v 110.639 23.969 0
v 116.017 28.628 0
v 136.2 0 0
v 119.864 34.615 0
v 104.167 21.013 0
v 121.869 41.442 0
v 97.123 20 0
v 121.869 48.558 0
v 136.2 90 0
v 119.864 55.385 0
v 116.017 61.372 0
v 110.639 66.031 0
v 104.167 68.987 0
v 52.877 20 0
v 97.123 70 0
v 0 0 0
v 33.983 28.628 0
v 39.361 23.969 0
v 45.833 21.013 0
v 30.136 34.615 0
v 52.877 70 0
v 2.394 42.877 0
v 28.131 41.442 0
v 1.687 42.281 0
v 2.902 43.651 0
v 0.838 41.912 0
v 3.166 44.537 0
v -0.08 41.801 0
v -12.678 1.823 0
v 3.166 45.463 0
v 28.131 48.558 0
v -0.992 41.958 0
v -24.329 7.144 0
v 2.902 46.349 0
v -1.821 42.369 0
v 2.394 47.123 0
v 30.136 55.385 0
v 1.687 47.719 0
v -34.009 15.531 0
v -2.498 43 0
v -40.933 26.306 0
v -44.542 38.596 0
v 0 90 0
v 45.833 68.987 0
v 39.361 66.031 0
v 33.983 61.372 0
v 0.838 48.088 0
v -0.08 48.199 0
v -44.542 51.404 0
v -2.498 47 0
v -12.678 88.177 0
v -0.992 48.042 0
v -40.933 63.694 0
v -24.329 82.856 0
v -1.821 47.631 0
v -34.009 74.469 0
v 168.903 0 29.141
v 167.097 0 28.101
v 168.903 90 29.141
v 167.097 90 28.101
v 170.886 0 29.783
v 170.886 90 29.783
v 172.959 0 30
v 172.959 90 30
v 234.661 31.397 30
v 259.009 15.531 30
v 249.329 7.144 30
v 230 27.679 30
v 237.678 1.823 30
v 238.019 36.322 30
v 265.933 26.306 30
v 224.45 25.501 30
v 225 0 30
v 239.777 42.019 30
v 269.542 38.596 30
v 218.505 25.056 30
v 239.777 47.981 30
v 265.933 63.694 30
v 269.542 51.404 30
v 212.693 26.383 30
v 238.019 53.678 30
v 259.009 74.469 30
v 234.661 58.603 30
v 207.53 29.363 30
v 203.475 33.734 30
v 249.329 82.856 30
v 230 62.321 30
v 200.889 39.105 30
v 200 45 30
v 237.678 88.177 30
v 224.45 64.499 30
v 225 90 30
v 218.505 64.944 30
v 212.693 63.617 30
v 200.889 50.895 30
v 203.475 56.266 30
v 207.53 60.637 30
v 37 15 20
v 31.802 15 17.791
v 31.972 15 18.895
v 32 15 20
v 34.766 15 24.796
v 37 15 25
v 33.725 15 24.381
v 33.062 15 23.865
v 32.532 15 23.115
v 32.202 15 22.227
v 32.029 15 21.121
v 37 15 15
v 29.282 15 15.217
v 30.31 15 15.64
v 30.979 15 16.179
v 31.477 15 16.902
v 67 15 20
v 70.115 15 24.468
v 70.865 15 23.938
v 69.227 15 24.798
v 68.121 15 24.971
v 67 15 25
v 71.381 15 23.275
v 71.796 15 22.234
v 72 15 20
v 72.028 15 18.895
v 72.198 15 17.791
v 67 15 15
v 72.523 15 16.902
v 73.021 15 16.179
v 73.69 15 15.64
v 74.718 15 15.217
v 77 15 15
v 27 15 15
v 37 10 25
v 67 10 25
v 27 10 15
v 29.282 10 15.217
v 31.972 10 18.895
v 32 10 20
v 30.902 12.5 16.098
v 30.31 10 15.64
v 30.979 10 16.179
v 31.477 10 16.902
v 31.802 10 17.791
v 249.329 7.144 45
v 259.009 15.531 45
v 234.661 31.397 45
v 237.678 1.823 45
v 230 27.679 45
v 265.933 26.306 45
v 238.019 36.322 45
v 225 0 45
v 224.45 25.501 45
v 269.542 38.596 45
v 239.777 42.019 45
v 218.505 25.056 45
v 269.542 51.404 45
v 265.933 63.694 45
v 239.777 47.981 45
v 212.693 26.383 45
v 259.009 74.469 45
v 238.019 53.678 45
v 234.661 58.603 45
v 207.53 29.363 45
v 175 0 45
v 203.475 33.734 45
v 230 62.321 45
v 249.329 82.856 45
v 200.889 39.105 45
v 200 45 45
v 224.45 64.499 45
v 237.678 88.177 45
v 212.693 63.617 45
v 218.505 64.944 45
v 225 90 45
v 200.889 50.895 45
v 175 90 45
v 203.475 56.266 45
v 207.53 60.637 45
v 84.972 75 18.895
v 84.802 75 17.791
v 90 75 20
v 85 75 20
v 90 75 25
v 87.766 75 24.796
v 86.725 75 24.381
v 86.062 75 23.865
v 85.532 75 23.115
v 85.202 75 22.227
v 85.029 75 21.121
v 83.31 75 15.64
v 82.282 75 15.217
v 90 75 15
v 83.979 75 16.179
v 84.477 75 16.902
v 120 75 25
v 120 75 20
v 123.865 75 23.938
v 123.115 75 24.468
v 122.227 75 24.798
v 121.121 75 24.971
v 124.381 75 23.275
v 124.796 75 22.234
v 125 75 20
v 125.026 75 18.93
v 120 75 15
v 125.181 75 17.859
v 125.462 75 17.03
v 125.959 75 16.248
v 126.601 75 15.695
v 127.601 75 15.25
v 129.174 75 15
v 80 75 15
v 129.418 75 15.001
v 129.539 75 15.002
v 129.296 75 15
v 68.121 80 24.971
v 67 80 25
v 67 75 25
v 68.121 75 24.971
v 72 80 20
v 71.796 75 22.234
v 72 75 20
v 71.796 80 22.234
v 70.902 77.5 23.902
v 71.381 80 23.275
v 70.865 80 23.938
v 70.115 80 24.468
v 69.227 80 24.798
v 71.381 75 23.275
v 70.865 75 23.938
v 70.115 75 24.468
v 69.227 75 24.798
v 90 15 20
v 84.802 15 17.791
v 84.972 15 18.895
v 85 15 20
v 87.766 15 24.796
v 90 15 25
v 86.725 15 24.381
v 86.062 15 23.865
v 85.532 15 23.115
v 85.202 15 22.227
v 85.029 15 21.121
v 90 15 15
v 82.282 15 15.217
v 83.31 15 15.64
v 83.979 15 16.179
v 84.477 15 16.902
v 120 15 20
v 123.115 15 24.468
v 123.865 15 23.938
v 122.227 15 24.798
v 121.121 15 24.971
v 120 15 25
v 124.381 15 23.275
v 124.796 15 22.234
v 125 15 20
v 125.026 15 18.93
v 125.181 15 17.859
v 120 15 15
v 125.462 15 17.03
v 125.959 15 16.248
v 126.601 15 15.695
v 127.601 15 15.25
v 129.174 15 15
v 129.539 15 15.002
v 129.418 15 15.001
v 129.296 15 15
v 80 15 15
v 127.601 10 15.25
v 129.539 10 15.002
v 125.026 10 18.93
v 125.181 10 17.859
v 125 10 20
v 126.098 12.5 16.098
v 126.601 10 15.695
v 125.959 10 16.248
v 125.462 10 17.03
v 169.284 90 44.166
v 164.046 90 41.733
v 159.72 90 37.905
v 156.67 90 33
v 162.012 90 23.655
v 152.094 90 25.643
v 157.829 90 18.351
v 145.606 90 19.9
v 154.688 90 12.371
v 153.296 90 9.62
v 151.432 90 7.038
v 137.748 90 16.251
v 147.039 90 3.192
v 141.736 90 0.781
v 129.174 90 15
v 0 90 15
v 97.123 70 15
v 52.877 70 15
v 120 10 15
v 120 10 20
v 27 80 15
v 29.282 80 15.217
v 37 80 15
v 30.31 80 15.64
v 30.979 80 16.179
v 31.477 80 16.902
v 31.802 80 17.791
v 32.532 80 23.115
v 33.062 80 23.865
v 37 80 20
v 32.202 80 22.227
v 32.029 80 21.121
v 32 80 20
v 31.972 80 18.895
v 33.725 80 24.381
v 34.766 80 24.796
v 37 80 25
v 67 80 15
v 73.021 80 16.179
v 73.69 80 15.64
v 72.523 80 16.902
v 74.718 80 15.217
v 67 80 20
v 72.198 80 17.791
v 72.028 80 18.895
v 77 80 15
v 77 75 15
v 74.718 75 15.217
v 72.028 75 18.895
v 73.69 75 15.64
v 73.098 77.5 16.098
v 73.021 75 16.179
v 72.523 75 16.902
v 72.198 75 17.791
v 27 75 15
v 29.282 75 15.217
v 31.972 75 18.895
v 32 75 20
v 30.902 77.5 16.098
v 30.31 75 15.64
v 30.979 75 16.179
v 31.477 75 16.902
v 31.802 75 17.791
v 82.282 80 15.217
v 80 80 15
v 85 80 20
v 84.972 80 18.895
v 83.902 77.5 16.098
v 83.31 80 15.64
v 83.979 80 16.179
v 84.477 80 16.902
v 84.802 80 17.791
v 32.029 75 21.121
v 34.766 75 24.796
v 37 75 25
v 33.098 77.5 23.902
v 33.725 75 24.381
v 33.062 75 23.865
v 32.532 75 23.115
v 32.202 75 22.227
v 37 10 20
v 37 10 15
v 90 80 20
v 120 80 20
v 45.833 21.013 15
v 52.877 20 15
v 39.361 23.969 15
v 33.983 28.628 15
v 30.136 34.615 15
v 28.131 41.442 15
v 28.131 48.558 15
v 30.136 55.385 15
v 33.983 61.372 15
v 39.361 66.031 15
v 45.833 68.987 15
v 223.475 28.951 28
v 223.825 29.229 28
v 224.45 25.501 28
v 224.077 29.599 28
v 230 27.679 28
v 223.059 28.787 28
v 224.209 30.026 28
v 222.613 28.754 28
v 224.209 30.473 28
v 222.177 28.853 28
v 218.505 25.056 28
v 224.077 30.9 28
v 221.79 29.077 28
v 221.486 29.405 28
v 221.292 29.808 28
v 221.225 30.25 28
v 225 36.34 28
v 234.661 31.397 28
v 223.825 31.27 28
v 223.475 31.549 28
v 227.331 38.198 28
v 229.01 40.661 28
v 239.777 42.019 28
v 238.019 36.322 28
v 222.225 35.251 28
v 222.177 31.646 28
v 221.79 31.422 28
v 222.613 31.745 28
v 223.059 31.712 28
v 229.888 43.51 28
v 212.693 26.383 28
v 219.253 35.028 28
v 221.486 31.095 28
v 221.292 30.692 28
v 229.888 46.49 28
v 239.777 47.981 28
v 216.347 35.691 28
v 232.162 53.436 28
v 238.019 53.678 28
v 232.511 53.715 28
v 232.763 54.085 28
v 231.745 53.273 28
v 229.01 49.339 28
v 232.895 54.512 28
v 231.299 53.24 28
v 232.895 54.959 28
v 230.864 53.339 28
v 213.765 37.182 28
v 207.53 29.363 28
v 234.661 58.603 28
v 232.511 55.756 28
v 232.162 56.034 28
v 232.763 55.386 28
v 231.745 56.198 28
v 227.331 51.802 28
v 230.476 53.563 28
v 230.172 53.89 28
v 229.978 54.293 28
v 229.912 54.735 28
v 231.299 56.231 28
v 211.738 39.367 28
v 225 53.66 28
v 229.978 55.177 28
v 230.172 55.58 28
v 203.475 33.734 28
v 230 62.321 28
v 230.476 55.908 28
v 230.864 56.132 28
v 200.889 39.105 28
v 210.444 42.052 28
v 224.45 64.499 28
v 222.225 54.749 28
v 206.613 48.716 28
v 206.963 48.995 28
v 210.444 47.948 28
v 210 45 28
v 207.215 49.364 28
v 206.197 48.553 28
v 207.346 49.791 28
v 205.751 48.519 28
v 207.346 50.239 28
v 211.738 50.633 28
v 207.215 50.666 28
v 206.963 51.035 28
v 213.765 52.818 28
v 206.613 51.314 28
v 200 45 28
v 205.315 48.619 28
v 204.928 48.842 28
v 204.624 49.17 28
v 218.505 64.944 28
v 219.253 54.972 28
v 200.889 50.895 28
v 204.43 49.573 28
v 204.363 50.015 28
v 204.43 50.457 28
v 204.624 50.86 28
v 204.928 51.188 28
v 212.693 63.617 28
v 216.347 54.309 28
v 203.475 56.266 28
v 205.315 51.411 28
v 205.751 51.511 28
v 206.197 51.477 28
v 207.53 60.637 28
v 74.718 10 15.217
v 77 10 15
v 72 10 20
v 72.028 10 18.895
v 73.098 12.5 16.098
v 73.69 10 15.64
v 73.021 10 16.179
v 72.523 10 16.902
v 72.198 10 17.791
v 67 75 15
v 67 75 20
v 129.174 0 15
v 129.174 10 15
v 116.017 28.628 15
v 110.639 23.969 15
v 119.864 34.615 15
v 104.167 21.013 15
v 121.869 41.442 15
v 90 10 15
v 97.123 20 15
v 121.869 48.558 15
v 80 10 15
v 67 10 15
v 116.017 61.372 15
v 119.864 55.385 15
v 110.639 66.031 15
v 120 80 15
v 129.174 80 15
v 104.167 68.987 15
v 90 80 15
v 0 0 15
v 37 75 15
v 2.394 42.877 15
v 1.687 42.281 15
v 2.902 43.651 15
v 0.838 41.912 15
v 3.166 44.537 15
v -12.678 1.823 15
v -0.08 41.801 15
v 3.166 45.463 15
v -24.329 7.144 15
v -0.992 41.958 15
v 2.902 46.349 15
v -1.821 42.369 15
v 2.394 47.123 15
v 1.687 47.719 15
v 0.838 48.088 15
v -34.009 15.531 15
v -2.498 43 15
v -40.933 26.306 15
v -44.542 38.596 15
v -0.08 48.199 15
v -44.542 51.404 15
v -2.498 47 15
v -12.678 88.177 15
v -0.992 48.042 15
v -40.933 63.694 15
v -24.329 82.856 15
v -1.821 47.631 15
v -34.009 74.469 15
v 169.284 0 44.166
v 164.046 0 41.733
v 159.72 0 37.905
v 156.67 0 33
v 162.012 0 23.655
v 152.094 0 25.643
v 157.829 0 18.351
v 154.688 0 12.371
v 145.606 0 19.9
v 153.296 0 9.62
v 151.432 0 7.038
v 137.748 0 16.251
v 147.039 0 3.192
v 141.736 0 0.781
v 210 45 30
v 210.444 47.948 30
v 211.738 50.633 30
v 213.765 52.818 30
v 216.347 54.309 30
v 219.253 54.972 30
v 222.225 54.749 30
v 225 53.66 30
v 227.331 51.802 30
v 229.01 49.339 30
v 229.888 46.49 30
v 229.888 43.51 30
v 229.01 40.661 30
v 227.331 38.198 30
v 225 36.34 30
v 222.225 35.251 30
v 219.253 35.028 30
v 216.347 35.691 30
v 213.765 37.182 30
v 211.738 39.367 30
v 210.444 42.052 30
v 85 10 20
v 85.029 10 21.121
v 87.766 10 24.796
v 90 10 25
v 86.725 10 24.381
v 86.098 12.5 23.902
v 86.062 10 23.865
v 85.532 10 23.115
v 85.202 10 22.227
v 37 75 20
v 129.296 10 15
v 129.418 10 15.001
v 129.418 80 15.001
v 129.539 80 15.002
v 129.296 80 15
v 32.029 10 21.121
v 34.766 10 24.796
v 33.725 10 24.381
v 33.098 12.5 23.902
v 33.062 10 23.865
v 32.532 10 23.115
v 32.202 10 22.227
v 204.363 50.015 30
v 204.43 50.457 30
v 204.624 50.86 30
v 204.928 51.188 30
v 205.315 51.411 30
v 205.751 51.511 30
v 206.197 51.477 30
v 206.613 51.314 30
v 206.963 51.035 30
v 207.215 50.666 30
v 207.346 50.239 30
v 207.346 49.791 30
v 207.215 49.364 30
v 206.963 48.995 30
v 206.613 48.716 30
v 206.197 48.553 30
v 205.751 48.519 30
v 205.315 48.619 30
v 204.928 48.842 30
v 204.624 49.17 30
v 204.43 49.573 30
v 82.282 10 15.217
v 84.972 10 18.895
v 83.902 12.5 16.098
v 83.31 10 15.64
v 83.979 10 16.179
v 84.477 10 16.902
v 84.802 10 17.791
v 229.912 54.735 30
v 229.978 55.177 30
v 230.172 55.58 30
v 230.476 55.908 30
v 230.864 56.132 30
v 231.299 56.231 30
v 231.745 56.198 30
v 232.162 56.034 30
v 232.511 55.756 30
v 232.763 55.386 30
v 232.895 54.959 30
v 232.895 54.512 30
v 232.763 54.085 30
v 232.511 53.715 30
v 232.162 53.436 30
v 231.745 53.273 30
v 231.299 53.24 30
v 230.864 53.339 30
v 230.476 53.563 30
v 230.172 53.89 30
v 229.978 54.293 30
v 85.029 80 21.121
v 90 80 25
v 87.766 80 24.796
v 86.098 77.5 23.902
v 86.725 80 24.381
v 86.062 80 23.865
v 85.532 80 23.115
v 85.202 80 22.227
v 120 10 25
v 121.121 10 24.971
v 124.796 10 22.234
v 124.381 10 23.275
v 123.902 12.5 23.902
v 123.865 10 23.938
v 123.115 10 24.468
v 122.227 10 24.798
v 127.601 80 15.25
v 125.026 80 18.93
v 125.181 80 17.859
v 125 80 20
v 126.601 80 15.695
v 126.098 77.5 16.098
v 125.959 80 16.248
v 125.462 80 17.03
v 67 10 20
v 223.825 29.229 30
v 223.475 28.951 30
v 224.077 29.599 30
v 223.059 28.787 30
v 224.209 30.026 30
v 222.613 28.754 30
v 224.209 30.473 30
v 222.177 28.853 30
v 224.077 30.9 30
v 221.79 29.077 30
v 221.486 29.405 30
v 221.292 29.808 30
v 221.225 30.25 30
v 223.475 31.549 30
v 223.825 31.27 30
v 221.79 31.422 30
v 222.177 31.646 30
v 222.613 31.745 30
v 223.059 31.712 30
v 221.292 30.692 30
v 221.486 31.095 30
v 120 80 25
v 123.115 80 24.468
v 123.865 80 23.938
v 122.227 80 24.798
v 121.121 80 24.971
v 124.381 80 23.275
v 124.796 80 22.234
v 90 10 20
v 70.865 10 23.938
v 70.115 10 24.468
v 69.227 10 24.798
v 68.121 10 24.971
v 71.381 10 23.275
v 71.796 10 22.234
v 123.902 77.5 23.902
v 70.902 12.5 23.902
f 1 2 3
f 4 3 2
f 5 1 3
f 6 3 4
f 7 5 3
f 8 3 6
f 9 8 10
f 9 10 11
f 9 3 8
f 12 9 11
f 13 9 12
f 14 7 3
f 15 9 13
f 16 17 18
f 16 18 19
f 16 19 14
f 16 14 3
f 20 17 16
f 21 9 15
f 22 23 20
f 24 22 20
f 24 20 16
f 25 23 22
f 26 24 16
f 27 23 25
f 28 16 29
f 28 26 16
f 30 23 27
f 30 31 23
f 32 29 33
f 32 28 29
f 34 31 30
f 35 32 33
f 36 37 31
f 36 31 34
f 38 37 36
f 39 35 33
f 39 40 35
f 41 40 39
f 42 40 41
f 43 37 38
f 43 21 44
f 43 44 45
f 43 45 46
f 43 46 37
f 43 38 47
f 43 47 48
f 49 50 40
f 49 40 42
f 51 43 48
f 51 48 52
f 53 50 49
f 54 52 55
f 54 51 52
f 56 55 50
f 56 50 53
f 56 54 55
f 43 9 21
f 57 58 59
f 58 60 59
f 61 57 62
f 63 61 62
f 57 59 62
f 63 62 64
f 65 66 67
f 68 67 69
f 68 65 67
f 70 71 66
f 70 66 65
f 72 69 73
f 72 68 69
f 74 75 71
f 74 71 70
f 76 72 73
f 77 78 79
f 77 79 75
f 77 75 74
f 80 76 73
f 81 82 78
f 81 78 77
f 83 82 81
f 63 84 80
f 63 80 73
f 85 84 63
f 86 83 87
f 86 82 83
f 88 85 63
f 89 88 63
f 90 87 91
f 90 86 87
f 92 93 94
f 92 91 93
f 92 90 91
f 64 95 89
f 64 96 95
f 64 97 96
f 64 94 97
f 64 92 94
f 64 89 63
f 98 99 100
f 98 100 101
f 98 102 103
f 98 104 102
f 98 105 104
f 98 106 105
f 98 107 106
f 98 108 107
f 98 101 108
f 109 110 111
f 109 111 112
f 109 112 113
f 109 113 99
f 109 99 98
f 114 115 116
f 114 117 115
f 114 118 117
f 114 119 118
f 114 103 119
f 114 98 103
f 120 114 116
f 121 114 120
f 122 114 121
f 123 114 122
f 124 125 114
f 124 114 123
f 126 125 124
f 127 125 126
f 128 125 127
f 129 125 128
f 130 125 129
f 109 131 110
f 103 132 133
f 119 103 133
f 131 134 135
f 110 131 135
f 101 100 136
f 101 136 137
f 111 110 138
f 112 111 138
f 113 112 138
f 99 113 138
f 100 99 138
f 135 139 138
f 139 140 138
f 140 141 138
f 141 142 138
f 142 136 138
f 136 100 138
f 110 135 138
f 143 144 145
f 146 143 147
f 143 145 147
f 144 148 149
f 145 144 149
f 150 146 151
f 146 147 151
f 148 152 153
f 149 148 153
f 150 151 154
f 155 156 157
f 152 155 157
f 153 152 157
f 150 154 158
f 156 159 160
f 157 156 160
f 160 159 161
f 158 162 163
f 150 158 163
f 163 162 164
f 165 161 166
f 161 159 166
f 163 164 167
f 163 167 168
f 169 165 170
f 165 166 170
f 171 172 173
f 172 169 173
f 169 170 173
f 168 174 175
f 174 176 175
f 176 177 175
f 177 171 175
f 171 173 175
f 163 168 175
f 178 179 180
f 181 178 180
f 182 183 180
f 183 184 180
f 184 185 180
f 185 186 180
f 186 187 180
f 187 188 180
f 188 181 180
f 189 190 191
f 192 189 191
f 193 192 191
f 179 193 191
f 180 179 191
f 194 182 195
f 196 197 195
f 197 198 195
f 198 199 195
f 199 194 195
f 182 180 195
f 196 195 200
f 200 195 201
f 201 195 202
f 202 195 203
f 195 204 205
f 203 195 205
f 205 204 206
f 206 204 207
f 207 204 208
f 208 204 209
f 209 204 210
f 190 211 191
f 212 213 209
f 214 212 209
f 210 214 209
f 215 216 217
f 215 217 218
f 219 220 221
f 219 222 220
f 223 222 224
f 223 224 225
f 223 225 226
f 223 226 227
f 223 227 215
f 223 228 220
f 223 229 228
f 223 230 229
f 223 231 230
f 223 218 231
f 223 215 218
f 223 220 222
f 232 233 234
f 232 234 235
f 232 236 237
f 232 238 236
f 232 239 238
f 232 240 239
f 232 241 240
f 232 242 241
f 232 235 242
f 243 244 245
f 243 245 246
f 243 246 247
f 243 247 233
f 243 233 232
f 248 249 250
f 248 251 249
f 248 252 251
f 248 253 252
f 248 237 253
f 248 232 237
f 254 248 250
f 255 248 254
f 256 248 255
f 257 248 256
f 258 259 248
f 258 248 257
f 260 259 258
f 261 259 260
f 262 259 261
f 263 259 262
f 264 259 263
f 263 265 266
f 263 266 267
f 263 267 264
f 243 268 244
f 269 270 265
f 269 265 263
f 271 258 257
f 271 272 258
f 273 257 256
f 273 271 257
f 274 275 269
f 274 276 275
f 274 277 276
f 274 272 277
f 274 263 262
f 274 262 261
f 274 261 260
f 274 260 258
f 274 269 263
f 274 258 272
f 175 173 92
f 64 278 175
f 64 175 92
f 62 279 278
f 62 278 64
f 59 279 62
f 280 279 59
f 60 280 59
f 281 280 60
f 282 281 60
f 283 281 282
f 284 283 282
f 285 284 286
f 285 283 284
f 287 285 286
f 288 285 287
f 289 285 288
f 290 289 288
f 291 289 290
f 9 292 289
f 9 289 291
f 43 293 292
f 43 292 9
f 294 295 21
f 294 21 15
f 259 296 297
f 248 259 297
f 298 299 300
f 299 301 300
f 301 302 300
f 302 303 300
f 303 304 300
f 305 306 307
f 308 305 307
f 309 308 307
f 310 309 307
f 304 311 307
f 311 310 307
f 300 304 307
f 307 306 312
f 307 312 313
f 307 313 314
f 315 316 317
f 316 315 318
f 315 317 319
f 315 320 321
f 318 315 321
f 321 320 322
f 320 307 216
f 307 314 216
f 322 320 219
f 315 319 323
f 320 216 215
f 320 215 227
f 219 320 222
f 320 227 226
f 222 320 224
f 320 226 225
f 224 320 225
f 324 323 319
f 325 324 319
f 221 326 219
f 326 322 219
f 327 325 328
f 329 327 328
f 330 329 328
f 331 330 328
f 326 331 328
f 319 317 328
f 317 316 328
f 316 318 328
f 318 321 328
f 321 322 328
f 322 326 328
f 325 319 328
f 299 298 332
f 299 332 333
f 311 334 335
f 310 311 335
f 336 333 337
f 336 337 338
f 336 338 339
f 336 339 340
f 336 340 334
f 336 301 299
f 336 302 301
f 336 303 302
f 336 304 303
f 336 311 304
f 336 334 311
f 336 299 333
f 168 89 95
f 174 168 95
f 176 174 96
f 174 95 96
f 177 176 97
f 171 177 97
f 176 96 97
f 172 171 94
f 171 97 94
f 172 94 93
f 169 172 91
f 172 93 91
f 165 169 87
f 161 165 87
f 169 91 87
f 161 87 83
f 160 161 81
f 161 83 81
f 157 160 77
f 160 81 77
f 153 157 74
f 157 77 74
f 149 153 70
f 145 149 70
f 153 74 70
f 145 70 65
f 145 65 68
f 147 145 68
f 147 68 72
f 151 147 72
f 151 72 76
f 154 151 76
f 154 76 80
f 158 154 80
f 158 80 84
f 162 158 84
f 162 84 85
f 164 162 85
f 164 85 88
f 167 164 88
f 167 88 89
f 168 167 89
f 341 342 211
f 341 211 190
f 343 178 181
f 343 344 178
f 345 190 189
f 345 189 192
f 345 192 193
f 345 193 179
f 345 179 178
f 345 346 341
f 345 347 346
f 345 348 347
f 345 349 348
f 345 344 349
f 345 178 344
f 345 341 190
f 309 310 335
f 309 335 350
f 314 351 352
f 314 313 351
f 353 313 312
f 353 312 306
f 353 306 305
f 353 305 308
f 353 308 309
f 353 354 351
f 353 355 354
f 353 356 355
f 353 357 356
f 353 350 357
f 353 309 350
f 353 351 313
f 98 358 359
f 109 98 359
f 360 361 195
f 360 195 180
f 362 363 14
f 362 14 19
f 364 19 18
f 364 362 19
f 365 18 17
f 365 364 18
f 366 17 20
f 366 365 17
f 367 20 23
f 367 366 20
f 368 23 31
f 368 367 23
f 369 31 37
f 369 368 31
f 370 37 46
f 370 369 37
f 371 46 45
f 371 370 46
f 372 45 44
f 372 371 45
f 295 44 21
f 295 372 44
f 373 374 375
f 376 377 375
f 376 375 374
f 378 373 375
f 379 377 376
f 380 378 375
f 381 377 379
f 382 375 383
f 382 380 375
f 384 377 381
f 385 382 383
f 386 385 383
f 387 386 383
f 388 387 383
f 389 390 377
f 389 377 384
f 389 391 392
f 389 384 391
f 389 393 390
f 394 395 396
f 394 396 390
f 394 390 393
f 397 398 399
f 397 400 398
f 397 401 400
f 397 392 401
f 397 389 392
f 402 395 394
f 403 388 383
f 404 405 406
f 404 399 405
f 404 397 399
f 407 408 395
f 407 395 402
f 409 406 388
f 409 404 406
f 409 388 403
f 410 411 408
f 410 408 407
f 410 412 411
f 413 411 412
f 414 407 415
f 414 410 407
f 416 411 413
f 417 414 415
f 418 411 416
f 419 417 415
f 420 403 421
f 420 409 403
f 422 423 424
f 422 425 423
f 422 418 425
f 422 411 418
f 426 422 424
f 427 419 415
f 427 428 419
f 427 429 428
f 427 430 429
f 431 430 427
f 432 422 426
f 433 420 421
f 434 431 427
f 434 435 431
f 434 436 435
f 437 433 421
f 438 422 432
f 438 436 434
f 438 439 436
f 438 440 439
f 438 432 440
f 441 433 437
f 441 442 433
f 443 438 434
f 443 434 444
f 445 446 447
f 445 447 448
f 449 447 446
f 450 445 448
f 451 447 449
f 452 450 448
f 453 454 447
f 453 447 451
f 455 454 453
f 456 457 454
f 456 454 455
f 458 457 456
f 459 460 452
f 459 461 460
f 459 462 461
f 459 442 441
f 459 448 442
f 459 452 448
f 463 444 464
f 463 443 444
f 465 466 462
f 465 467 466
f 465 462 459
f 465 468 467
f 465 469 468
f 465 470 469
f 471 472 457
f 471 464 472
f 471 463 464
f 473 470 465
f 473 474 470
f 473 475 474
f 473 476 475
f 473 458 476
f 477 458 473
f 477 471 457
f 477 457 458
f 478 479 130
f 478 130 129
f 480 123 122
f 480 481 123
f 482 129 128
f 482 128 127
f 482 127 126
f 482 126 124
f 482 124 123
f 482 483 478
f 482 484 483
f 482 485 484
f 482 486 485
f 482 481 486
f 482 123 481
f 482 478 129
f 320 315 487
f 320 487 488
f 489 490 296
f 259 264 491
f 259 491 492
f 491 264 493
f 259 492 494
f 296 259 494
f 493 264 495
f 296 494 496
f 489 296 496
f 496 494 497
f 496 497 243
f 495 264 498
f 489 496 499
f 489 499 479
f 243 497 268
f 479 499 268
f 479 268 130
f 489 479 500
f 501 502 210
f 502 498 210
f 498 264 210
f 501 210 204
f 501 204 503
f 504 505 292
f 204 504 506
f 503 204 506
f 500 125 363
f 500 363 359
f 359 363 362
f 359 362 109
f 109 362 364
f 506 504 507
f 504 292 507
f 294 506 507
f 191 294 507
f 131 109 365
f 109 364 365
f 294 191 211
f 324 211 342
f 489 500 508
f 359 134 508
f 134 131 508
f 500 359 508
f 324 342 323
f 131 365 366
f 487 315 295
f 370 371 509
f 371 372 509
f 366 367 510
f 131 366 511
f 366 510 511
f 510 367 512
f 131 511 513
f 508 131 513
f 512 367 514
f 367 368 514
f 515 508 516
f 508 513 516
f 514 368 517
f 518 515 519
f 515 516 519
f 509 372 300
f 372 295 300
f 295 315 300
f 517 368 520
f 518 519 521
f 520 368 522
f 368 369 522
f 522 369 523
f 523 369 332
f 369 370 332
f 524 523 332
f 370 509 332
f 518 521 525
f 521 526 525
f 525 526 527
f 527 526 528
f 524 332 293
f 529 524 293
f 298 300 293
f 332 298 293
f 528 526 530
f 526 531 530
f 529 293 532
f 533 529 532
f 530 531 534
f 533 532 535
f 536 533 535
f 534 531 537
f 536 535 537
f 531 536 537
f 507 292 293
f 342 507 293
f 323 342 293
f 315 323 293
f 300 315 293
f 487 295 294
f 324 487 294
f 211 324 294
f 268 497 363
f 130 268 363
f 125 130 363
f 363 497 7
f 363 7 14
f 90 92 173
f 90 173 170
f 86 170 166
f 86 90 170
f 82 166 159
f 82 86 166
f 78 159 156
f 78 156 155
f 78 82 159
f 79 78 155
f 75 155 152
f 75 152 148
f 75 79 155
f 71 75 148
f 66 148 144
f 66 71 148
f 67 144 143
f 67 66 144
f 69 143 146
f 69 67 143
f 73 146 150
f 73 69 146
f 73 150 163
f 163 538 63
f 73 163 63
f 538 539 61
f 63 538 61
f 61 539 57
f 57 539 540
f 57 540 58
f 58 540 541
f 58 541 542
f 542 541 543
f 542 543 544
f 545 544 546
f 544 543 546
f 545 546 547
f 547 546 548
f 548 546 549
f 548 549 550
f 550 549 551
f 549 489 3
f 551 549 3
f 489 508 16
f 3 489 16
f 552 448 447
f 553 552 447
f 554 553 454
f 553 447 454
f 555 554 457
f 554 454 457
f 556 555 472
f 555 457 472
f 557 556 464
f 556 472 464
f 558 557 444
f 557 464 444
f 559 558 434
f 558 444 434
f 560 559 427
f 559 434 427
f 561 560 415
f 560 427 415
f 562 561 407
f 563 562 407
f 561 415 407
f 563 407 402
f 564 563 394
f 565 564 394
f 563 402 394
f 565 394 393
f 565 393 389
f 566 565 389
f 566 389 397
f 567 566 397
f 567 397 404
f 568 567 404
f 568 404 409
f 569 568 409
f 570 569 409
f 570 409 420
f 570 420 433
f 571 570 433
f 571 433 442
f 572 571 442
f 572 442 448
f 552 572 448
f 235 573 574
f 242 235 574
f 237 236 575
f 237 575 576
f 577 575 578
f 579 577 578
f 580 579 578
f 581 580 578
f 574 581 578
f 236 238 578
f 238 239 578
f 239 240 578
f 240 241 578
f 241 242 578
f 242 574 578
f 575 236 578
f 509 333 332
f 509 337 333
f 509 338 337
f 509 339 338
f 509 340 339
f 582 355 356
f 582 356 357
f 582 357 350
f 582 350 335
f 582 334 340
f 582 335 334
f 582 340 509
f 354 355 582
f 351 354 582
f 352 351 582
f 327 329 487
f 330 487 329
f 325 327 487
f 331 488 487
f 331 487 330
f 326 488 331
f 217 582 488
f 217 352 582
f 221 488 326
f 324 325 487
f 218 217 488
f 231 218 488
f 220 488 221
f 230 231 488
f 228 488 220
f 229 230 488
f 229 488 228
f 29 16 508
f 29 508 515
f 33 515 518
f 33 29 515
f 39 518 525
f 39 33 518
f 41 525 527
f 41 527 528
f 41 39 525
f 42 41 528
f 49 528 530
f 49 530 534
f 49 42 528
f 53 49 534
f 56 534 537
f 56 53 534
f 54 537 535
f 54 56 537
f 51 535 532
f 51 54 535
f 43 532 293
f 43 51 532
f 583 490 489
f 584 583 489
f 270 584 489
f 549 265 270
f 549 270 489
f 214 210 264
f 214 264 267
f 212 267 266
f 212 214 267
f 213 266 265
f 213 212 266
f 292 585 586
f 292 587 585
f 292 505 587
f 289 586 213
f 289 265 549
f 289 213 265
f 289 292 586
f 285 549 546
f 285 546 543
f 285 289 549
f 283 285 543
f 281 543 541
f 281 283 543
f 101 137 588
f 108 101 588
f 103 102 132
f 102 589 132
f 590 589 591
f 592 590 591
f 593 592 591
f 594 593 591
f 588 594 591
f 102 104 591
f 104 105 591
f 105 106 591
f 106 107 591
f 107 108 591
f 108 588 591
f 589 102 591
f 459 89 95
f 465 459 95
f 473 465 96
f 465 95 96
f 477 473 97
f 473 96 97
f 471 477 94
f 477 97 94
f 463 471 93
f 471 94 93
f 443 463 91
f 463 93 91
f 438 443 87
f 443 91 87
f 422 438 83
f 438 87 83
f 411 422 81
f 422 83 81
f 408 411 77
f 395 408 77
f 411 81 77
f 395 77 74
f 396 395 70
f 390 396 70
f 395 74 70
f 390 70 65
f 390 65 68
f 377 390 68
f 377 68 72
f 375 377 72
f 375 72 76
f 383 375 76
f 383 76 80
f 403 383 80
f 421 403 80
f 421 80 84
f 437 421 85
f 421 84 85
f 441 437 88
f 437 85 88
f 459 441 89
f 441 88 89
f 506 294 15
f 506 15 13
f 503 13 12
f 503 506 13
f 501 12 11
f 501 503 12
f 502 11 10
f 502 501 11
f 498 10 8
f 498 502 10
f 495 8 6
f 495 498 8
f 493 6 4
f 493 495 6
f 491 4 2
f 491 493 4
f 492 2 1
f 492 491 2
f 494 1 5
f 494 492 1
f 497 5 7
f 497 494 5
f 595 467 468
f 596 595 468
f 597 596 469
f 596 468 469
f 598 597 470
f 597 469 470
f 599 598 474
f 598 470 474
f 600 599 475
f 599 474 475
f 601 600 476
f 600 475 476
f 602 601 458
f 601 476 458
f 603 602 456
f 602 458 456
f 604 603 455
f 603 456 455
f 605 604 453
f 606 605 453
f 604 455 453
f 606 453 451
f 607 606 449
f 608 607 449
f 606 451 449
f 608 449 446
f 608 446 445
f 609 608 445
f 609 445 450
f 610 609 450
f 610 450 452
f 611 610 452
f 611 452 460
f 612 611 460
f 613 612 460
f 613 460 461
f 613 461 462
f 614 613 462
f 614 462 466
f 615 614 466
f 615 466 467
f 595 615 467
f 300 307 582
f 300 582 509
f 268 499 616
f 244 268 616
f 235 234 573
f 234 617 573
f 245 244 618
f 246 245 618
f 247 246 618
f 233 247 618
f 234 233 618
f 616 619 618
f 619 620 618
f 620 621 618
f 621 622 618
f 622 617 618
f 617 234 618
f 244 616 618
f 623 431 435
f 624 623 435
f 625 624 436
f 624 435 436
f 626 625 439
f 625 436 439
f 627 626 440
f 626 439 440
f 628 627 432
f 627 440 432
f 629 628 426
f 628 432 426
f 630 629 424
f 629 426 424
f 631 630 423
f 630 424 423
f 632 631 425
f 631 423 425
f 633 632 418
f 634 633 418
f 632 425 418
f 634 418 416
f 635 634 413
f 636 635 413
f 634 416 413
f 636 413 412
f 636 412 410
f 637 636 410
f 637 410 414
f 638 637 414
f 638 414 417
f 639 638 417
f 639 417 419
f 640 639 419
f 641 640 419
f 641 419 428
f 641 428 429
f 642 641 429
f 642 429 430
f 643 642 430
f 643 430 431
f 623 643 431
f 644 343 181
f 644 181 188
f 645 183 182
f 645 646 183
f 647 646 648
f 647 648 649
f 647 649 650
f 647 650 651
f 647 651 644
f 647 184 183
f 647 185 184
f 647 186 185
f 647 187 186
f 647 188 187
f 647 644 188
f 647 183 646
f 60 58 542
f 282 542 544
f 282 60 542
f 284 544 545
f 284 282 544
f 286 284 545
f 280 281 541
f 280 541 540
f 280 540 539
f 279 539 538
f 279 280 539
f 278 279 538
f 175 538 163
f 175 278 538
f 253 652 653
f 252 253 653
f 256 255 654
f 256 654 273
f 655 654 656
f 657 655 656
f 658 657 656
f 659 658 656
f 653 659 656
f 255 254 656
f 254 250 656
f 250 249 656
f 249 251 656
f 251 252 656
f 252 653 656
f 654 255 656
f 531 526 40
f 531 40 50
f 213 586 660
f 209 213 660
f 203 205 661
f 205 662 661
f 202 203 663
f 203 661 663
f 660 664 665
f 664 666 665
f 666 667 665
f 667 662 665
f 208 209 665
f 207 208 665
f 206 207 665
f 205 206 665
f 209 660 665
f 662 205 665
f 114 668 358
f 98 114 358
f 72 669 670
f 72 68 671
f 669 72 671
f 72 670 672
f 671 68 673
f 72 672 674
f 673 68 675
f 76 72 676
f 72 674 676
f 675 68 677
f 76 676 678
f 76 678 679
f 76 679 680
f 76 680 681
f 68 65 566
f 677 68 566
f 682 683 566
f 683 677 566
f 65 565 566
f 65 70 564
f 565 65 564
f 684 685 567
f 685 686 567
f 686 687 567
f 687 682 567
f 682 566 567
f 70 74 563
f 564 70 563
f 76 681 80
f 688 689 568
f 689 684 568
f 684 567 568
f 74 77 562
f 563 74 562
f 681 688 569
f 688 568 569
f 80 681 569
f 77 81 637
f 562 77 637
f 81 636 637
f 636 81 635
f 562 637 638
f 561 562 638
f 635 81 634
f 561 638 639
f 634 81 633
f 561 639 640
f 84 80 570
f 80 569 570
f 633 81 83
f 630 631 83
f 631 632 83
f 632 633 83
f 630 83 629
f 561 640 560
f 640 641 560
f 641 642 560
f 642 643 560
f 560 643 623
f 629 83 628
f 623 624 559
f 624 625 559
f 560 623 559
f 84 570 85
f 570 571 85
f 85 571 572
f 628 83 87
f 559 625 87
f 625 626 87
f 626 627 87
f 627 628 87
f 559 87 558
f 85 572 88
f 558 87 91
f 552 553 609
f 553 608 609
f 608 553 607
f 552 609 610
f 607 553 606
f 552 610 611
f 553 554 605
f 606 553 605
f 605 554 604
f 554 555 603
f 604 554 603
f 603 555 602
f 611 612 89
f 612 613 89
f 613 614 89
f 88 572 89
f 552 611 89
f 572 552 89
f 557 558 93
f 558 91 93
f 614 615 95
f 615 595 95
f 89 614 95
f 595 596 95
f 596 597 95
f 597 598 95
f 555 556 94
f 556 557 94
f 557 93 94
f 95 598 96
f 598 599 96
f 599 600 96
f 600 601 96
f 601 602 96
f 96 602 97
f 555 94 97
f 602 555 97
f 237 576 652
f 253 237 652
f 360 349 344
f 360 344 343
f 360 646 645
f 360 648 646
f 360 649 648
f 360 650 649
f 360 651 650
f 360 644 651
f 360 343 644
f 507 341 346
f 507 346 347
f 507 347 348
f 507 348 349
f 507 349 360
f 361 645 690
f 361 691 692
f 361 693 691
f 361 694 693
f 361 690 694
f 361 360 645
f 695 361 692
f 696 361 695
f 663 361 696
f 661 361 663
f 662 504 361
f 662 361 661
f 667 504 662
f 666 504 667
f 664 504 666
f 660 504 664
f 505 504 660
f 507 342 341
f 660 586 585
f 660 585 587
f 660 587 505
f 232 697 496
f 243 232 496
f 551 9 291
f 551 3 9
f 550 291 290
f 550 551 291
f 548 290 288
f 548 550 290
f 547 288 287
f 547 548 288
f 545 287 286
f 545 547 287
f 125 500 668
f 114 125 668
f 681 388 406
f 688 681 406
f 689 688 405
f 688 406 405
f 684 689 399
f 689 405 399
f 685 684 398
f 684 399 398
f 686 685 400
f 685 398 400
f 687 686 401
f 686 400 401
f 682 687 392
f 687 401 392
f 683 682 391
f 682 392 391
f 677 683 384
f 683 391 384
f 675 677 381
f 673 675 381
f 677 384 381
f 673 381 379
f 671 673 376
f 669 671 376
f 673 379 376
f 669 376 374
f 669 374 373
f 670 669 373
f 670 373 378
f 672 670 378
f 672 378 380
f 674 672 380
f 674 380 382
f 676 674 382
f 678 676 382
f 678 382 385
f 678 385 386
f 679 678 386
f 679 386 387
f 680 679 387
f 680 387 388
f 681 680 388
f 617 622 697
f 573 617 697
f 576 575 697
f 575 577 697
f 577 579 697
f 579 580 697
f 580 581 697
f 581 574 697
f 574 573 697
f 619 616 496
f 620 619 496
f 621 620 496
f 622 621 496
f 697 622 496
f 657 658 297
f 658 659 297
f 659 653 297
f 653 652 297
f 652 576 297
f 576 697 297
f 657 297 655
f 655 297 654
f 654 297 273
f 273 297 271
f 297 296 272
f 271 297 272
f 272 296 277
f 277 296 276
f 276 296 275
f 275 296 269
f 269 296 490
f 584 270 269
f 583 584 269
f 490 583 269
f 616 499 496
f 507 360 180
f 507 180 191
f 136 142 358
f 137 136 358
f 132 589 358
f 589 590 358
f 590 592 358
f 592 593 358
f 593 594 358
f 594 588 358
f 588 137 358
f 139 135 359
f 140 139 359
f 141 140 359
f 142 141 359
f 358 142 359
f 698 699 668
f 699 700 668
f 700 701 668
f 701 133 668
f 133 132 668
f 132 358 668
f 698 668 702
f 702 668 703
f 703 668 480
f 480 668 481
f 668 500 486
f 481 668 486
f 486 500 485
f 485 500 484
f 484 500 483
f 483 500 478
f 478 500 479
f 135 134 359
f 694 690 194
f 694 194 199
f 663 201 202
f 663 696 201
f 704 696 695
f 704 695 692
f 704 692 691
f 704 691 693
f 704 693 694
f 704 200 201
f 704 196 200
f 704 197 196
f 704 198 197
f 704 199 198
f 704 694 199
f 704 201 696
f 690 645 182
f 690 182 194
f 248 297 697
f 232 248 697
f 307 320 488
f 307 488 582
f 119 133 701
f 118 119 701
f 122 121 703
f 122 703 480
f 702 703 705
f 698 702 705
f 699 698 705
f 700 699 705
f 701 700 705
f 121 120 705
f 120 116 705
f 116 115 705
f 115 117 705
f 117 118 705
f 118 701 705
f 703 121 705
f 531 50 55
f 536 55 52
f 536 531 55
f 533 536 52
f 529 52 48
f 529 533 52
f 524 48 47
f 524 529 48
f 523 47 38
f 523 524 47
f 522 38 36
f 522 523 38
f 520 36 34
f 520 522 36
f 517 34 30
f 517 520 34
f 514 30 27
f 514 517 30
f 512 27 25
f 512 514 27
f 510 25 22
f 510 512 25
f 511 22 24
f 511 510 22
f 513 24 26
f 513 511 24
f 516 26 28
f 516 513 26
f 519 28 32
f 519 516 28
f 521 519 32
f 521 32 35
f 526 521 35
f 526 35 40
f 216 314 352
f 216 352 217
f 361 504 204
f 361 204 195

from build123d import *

# Parameters (mm, degrees)
BOSS_EXTRU_1_DEPTH                = 15
ESQUISSE2_W                       = 15
ESQUISSE2_H                       = 90
BOSS_EXTRU_2_DEPTH                = 15
BOSS_EXTRU_3_DEPTH                = 15
ENL_V_MAT_EXTRU_2_DEPTH           = 287.181760425
ESQUISSE11_R                      = 20
ENL_V_MAT_EXTRU_3_DEPTH           = 20
BOSS_EXTRU_5_DEPTH                = 5
R_P_TITION_LIN_AIRE2_COUNT        = 2
R_P_TITION_LIN_AIRE2_PITCH        = 53
R_P_TITION_LIN_AIRE2_COPY_1_DEPTH = 5
CONG_3_SIZE                       = 5
CONG_4_R                          = 20
CONG_8_R                          = 30
ENL_V_MAT_EXTRU_4_DEPTH           = 289.140590716
CONG_9_R                          = 20
CONG_10_R                         = 10
ESQUISSE23_R                      = 20
BOSS_EXTRU_7_DEPTH                = 2
ESQUISSE24_R                      = 10
ESQUISSE24_R_2                    = 1.5
ENL_V_MAT_EXTRU_5_DEPTH           = 5
ENL_V_MAT_EXTRU_6_DEPTH           = 287.181760467


with BuildPart() as part:
    # Esquisse1 → Boss.-Extru.1 (new body)
    with BuildSketch(Plane.XY):
        with BuildLine():
            Line((0, 90), (170, 90))
            Line((170, 90), (170, 0))
            Line((170, 0), (0, 0))
            ThreePointArc((0, 0), (-45, 45), (0, 90))
        make_face()
    extrude(amount=BOSS_EXTRU_1_DEPTH)

    # Esquisse2 → Boss.-Extru.2 (add)
    with BuildSketch(Plane.XY.offset(15)):
        with Locations((162.5, 45)):
            Rectangle(ESQUISSE2_W, ESQUISSE2_H)
    extrude(amount=BOSS_EXTRU_2_DEPTH)

    # Esquisse3 → Boss.-Extru.3 (add)
    with BuildSketch(Plane.XY.offset(30)):
        with BuildLine():
            Line((155, 90), (225, 90))
            ThreePointArc((225, 90), (270, 45), (225, 0))
            Line((225, 0), (155, 0))
            Line((155, 0), (155, 90))
        make_face()
    extrude(amount=BOSS_EXTRU_3_DEPTH)

    # Esquisse10 → Enlèv. mat.-Extru.2 (cut, through all)
    with BuildSketch(Plane.XY.offset(15)):
        with BuildLine():
            Line((-2.497999199, 43), (-2.497999199, 47))
            ThreePointArc((-2.497999199, 47), (3.2, 45), (-2.497999199, 43))
        make_face()
    extrude(amount=-ENL_V_MAT_EXTRU_2_DEPTH, mode=Mode.SUBTRACT)

    # Esquisse11 → Enlèv. mat.-Extru.3 (cut)
    with BuildSketch(Plane(origin=(0, 0, 30), x_dir=(-1, 0, 0), z_dir=(0, 0, -1))):
        with Locations((-220, 45)):
            Circle(ESQUISSE11_R)
    extrude(amount=-ENL_V_MAT_EXTRU_3_DEPTH, mode=Mode.SUBTRACT)

    # Esquisse20 → Boss.-Extru.5 (add)
    with BuildSketch(Plane(origin=(0, 10, 0), x_dir=(1, 0, 0), z_dir=(0, 1, 0))):
        Polygon((125, -25), (125, -15), (120, -15), (120, -20), (90, -20), (90, -15), (85, -15), (85, -25), align=None)
    boss_extru_5 = extrude(amount=BOSS_EXTRU_5_DEPTH)

    # Symétrie2: Boss.-Extru.5 across plane
    add(boss_extru_5.mirror(Plane(origin=(170, 45, 0), x_dir=(0, 0, 1), z_dir=(0, -1, 0))))

    # Répétition linéaire2: Boss.-Extru.5 ×2
    with Locations(*[(-i * R_P_TITION_LIN_AIRE2_PITCH, 0, 0) for i in range(1, R_P_TITION_LIN_AIRE2_COUNT)]):
        add(boss_extru_5)

    # Répétition linéaire2 copy 1 sketch → Répétition linéaire2 copy 1 (add)
    with BuildSketch(Plane(origin=(-53, 80, 0), x_dir=(1, 0, 0), z_dir=(0, -1, 0))):
        Polygon((125, 25), (125, 15), (120, 15), (120, 20), (90, 20), (90, 15), (85, 15), (85, 25), align=None)
    extrude(amount=R_P_TITION_LIN_AIRE2_COPY_1_DEPTH)

    # Congé3
    # a fillet whose section is not a circle: 5 mm, written as the material it adds along each edge
    with BuildSketch(Plane(origin=(125, 80, 15), x_dir=(1, 0, 0), z_dir=(0, -1, 0)), Plane(origin=(72, 80, 15), x_dir=(1, 0, 0), z_dir=(0, -1, 0)), Plane(origin=(32, 10, 15), x_dir=(-1, 0, 0), z_dir=(0, 1, 0)), Plane(origin=(85, 10, 15), x_dir=(-1, 0, 0), z_dir=(0, 1, 0))) as cong_3_piece_1:
        with BuildLine():
            add(Edge.make_bspline([(CONG_3_SIZE, 0), (CONG_3_SIZE * 0.831801948466, 0), (CONG_3_SIZE * 0.663603896932, 0), (CONG_3_SIZE * 0.292893218813, CONG_3_SIZE * 0.0716919198361), (CONG_3_SIZE * 0.0716919198361, CONG_3_SIZE * 0.292893218813), (0, CONG_3_SIZE * 0.663603896932), (0, CONG_3_SIZE * 0.831801948466), (0, CONG_3_SIZE)], knots=[0, 0, 0, 0, 0, 0, 0.5, 0.5, 1, 1, 1, 1, 1, 1], degree=5))
            Line((0, CONG_3_SIZE), (0, 0))
            Line((0, 0), (CONG_3_SIZE, 0))
        make_face()
    extrude(amount=5)
    with BuildSketch(Plane(origin=(85, 80, 15), x_dir=(-1, 0, 0), z_dir=(0, -1, 0)), Plane(origin=(32, 80, 15), x_dir=(-1, 0, 0), z_dir=(0, -1, 0)), Plane(origin=(72, 10, 15), x_dir=(1, 0, 0), z_dir=(0, 1, 0)), Plane(origin=(125, 10, 15), x_dir=(1, 0, 0), z_dir=(0, 1, 0))) as cong_3_piece_2:
        with BuildLine():
            add(Edge.make_bspline([(CONG_3_SIZE, 0), (CONG_3_SIZE * 0.831801948466, 0), (CONG_3_SIZE * 0.663603896932, 0), (CONG_3_SIZE * 0.292893218813, -CONG_3_SIZE * 0.0716919198361), (CONG_3_SIZE * 0.0716919198361, -CONG_3_SIZE * 0.292893218813), (0, -CONG_3_SIZE * 0.663603896932), (0, -CONG_3_SIZE * 0.831801948466), (0, -CONG_3_SIZE)], knots=[0, 0, 0, 0, 0, 0, 0.5, 0.5, 1, 1, 1, 1, 1, 1], degree=5))
            Line((0, -CONG_3_SIZE), (0, 0))
            Line((0, 0), (CONG_3_SIZE, 0))
        make_face()
    extrude(amount=5)
    # a fillet whose section is not a circle: 5 mm, written as the material it takes off along each edge
    with BuildSketch(Plane(origin=(125, 92.5, 25), x_dir=(-1, 0, 0), z_dir=(0, -1, 0)), Plane(origin=(85, 92.5, 25), x_dir=(0, 0, -1), z_dir=(0, -1, 0)), Plane(origin=(32, 92.5, 25), x_dir=(0, 0, -1), z_dir=(0, -1, 0)), Plane(origin=(72, 92.5, 25), x_dir=(-1, 0, 0), z_dir=(0, -1, 0))) as cong_3_2_piece_1:
        with BuildLine():
            add(Edge.make_bspline([(CONG_3_SIZE, 0), (CONG_3_SIZE * 0.831801948466, 0), (CONG_3_SIZE * 0.663603896932, 0), (CONG_3_SIZE * 0.292893218813, CONG_3_SIZE * 0.0716919198361), (CONG_3_SIZE * 0.0716919198361, CONG_3_SIZE * 0.292893218813), (0, CONG_3_SIZE * 0.663603896932), (0, CONG_3_SIZE * 0.831801948466), (0, CONG_3_SIZE)], knots=[0, 0, 0, 0, 0, 0, 0.5, 0.5, 1, 1, 1, 1, 1, 1], degree=5))
            Line((0, CONG_3_SIZE), (0, 0))
            Line((0, 0), (CONG_3_SIZE, 0))
        make_face()
    extrude(amount=30, mode=Mode.SUBTRACT)
    with BuildSketch(Plane(origin=(32, -2.5, 25), x_dir=(0, 0, -1), z_dir=(0, 1, 0)), Plane(origin=(72, -2.5, 25), x_dir=(-1, 0, 0), z_dir=(0, 1, 0)), Plane(origin=(85, -2.5, 25), x_dir=(0, 0, -1), z_dir=(0, 1, 0)), Plane(origin=(125, -2.5, 25), x_dir=(-1, 0, 0), z_dir=(0, 1, 0))) as cong_3_2_piece_2:
        with BuildLine():
            add(Edge.make_bspline([(CONG_3_SIZE, 0), (CONG_3_SIZE * 0.831801948466, 0), (CONG_3_SIZE * 0.663603896932, 0), (CONG_3_SIZE * 0.292893218813, -CONG_3_SIZE * 0.0716919198361), (CONG_3_SIZE * 0.0716919198361, -CONG_3_SIZE * 0.292893218813), (0, -CONG_3_SIZE * 0.663603896932), (0, -CONG_3_SIZE * 0.831801948466), (0, -CONG_3_SIZE)], knots=[0, 0, 0, 0, 0, 0, 0.5, 0.5, 1, 1, 1, 1, 1, 1], degree=5))
            Line((0, -CONG_3_SIZE), (0, 0))
            Line((0, 0), (CONG_3_SIZE, 0))
        make_face()
    extrude(amount=30, mode=Mode.SUBTRACT)

    # Congé4
    cong_4_edges = [part.edges().sort_by_distance(p)[0] for p in [
        (155, 45, 45),
    ]]
    fillet(cong_4_edges, radius=CONG_4_R)

    # Congé8
    # the kernel refuses this fillet: 30 mm, written as the material it adds along each edge
    with BuildSketch(Plane(origin=(155, 90, 15), x_dir=(0.09236442858628174, 0, 0.9957252695055648), z_dir=(0, -1, 0))) as cong_8_piece_1:
        with BuildLine():
            CenterArc((27.486376802, 28.486291656), CONG_8_R, 185.299645608, 66.421821522)
            Line((-2.385381283, 25.715358799), (-5.372557092, 25.438265513))
            Line((-5.372557092, 25.438265513), (-2.987175809, -0.277093286))
            Line((-2.987175809, -0.277093286), (0.277093286, -2.987175809))
            ThreePointArc((0.277093286, -2.987175809), (10.234345981, -2.063531523), (17.136365349, -2.848629166))
            Line((17.136365349, -2.848629166), (18.077275481, 0))
        make_face()
    extrude(amount=90)
    # the kernel refuses this fillet: 30 mm, written as the material it takes off along each edge
    with BuildSketch(Plane(origin=(170, 165, 0), x_dir=(-1, 0, 0), z_dir=(0, -1, 0))) as cong_8_2_piece_1:
        with BuildLine():
            CenterArc((CONG_8_R, -CONG_8_R), CONG_8_R, 90, 90)
            Line((0, -CONG_8_R), (0, 0))
            Line((0, 0), (CONG_8_R, 0))
        make_face()
    extrude(amount=240, mode=Mode.SUBTRACT)

    # Esquisse21 → Enlèv. mat.-Extru.4 (cut, through all)
    with BuildSketch(Plane(origin=(0, 90, 0), x_dir=(1, 0, 0), z_dir=(0, 1, 0))):
        with BuildLine():
            ThreePointArc((170, -30), (157.850911613, -18.385534141), (152.154704801, -2.57258395))
            ThreePointArc((152.154704801, -2.57258395), (165.145985207, -13.639088412), (170, -30))
        make_face()
    extrude(amount=-ENL_V_MAT_EXTRU_4_DEPTH, mode=Mode.SUBTRACT)

    # Congé9
    cong_9_edges = [part.edges().sort_by_distance(p)[0] for p in [
        (152.154704801, 45, 2.57258395),
    ]]
    fillet(cong_9_edges, radius=CONG_9_R)

    # Congé10
    cong_10_edges = [part.edges().sort_by_distance(p)[0] for p in [
        (170, 45, 30),
    ]]
    fillet(cong_10_edges, radius=CONG_10_R)

    # Esquisse25 → Enlèv. mat.-Extru.6 (cut, through all)
    with BuildSketch(Plane.XY.offset(15)):
        with BuildLine():
            Line((52.876767067, 70), (97.123232933, 70))
            ThreePointArc((97.123232933, 70), (122.123232933, 45), (97.123232933, 20))
            Line((97.123232933, 20), (52.876767067, 20))
            ThreePointArc((52.876767067, 20), (27.876767067, 45), (52.876767067, 70))
        make_face()
    extrude(amount=-ENL_V_MAT_EXTRU_6_DEPTH, mode=Mode.SUBTRACT)


with BuildPart() as body_2:
    # Esquisse23 → Boss.-Extru.7 (new body)
    with BuildSketch(Plane(origin=(0, 0, 30), x_dir=(-1, 0, 0), z_dir=(0, 0, -1))):
        with Locations((-220, 45)):
            Circle(ESQUISSE23_R)
    extrude(amount=BOSS_EXTRU_7_DEPTH)

    # Esquisse24 → Enlèv. mat.-Extru.5 (cut)
    with BuildSketch(Plane(origin=(0, 0, 28), x_dir=(-1, 0, 0), z_dir=(0, 0, -1))):
        with Locations((-220, 45)):
            Circle(ESQUISSE24_R)
        with Locations((-205.863175268, 50.014996162)):
            Circle(ESQUISSE24_R_2)
        with Locations((-222.725298289, 30.249652572)):
            Circle(ESQUISSE24_R_2)
        with Locations((-231.411526442, 54.735351265)):
            Circle(ESQUISSE24_R_2)
    extrude(amount=-ENL_V_MAT_EXTRU_5_DEPTH, mode=Mode.SUBTRACT)


solid = Compound([part.part, body_2.part])
